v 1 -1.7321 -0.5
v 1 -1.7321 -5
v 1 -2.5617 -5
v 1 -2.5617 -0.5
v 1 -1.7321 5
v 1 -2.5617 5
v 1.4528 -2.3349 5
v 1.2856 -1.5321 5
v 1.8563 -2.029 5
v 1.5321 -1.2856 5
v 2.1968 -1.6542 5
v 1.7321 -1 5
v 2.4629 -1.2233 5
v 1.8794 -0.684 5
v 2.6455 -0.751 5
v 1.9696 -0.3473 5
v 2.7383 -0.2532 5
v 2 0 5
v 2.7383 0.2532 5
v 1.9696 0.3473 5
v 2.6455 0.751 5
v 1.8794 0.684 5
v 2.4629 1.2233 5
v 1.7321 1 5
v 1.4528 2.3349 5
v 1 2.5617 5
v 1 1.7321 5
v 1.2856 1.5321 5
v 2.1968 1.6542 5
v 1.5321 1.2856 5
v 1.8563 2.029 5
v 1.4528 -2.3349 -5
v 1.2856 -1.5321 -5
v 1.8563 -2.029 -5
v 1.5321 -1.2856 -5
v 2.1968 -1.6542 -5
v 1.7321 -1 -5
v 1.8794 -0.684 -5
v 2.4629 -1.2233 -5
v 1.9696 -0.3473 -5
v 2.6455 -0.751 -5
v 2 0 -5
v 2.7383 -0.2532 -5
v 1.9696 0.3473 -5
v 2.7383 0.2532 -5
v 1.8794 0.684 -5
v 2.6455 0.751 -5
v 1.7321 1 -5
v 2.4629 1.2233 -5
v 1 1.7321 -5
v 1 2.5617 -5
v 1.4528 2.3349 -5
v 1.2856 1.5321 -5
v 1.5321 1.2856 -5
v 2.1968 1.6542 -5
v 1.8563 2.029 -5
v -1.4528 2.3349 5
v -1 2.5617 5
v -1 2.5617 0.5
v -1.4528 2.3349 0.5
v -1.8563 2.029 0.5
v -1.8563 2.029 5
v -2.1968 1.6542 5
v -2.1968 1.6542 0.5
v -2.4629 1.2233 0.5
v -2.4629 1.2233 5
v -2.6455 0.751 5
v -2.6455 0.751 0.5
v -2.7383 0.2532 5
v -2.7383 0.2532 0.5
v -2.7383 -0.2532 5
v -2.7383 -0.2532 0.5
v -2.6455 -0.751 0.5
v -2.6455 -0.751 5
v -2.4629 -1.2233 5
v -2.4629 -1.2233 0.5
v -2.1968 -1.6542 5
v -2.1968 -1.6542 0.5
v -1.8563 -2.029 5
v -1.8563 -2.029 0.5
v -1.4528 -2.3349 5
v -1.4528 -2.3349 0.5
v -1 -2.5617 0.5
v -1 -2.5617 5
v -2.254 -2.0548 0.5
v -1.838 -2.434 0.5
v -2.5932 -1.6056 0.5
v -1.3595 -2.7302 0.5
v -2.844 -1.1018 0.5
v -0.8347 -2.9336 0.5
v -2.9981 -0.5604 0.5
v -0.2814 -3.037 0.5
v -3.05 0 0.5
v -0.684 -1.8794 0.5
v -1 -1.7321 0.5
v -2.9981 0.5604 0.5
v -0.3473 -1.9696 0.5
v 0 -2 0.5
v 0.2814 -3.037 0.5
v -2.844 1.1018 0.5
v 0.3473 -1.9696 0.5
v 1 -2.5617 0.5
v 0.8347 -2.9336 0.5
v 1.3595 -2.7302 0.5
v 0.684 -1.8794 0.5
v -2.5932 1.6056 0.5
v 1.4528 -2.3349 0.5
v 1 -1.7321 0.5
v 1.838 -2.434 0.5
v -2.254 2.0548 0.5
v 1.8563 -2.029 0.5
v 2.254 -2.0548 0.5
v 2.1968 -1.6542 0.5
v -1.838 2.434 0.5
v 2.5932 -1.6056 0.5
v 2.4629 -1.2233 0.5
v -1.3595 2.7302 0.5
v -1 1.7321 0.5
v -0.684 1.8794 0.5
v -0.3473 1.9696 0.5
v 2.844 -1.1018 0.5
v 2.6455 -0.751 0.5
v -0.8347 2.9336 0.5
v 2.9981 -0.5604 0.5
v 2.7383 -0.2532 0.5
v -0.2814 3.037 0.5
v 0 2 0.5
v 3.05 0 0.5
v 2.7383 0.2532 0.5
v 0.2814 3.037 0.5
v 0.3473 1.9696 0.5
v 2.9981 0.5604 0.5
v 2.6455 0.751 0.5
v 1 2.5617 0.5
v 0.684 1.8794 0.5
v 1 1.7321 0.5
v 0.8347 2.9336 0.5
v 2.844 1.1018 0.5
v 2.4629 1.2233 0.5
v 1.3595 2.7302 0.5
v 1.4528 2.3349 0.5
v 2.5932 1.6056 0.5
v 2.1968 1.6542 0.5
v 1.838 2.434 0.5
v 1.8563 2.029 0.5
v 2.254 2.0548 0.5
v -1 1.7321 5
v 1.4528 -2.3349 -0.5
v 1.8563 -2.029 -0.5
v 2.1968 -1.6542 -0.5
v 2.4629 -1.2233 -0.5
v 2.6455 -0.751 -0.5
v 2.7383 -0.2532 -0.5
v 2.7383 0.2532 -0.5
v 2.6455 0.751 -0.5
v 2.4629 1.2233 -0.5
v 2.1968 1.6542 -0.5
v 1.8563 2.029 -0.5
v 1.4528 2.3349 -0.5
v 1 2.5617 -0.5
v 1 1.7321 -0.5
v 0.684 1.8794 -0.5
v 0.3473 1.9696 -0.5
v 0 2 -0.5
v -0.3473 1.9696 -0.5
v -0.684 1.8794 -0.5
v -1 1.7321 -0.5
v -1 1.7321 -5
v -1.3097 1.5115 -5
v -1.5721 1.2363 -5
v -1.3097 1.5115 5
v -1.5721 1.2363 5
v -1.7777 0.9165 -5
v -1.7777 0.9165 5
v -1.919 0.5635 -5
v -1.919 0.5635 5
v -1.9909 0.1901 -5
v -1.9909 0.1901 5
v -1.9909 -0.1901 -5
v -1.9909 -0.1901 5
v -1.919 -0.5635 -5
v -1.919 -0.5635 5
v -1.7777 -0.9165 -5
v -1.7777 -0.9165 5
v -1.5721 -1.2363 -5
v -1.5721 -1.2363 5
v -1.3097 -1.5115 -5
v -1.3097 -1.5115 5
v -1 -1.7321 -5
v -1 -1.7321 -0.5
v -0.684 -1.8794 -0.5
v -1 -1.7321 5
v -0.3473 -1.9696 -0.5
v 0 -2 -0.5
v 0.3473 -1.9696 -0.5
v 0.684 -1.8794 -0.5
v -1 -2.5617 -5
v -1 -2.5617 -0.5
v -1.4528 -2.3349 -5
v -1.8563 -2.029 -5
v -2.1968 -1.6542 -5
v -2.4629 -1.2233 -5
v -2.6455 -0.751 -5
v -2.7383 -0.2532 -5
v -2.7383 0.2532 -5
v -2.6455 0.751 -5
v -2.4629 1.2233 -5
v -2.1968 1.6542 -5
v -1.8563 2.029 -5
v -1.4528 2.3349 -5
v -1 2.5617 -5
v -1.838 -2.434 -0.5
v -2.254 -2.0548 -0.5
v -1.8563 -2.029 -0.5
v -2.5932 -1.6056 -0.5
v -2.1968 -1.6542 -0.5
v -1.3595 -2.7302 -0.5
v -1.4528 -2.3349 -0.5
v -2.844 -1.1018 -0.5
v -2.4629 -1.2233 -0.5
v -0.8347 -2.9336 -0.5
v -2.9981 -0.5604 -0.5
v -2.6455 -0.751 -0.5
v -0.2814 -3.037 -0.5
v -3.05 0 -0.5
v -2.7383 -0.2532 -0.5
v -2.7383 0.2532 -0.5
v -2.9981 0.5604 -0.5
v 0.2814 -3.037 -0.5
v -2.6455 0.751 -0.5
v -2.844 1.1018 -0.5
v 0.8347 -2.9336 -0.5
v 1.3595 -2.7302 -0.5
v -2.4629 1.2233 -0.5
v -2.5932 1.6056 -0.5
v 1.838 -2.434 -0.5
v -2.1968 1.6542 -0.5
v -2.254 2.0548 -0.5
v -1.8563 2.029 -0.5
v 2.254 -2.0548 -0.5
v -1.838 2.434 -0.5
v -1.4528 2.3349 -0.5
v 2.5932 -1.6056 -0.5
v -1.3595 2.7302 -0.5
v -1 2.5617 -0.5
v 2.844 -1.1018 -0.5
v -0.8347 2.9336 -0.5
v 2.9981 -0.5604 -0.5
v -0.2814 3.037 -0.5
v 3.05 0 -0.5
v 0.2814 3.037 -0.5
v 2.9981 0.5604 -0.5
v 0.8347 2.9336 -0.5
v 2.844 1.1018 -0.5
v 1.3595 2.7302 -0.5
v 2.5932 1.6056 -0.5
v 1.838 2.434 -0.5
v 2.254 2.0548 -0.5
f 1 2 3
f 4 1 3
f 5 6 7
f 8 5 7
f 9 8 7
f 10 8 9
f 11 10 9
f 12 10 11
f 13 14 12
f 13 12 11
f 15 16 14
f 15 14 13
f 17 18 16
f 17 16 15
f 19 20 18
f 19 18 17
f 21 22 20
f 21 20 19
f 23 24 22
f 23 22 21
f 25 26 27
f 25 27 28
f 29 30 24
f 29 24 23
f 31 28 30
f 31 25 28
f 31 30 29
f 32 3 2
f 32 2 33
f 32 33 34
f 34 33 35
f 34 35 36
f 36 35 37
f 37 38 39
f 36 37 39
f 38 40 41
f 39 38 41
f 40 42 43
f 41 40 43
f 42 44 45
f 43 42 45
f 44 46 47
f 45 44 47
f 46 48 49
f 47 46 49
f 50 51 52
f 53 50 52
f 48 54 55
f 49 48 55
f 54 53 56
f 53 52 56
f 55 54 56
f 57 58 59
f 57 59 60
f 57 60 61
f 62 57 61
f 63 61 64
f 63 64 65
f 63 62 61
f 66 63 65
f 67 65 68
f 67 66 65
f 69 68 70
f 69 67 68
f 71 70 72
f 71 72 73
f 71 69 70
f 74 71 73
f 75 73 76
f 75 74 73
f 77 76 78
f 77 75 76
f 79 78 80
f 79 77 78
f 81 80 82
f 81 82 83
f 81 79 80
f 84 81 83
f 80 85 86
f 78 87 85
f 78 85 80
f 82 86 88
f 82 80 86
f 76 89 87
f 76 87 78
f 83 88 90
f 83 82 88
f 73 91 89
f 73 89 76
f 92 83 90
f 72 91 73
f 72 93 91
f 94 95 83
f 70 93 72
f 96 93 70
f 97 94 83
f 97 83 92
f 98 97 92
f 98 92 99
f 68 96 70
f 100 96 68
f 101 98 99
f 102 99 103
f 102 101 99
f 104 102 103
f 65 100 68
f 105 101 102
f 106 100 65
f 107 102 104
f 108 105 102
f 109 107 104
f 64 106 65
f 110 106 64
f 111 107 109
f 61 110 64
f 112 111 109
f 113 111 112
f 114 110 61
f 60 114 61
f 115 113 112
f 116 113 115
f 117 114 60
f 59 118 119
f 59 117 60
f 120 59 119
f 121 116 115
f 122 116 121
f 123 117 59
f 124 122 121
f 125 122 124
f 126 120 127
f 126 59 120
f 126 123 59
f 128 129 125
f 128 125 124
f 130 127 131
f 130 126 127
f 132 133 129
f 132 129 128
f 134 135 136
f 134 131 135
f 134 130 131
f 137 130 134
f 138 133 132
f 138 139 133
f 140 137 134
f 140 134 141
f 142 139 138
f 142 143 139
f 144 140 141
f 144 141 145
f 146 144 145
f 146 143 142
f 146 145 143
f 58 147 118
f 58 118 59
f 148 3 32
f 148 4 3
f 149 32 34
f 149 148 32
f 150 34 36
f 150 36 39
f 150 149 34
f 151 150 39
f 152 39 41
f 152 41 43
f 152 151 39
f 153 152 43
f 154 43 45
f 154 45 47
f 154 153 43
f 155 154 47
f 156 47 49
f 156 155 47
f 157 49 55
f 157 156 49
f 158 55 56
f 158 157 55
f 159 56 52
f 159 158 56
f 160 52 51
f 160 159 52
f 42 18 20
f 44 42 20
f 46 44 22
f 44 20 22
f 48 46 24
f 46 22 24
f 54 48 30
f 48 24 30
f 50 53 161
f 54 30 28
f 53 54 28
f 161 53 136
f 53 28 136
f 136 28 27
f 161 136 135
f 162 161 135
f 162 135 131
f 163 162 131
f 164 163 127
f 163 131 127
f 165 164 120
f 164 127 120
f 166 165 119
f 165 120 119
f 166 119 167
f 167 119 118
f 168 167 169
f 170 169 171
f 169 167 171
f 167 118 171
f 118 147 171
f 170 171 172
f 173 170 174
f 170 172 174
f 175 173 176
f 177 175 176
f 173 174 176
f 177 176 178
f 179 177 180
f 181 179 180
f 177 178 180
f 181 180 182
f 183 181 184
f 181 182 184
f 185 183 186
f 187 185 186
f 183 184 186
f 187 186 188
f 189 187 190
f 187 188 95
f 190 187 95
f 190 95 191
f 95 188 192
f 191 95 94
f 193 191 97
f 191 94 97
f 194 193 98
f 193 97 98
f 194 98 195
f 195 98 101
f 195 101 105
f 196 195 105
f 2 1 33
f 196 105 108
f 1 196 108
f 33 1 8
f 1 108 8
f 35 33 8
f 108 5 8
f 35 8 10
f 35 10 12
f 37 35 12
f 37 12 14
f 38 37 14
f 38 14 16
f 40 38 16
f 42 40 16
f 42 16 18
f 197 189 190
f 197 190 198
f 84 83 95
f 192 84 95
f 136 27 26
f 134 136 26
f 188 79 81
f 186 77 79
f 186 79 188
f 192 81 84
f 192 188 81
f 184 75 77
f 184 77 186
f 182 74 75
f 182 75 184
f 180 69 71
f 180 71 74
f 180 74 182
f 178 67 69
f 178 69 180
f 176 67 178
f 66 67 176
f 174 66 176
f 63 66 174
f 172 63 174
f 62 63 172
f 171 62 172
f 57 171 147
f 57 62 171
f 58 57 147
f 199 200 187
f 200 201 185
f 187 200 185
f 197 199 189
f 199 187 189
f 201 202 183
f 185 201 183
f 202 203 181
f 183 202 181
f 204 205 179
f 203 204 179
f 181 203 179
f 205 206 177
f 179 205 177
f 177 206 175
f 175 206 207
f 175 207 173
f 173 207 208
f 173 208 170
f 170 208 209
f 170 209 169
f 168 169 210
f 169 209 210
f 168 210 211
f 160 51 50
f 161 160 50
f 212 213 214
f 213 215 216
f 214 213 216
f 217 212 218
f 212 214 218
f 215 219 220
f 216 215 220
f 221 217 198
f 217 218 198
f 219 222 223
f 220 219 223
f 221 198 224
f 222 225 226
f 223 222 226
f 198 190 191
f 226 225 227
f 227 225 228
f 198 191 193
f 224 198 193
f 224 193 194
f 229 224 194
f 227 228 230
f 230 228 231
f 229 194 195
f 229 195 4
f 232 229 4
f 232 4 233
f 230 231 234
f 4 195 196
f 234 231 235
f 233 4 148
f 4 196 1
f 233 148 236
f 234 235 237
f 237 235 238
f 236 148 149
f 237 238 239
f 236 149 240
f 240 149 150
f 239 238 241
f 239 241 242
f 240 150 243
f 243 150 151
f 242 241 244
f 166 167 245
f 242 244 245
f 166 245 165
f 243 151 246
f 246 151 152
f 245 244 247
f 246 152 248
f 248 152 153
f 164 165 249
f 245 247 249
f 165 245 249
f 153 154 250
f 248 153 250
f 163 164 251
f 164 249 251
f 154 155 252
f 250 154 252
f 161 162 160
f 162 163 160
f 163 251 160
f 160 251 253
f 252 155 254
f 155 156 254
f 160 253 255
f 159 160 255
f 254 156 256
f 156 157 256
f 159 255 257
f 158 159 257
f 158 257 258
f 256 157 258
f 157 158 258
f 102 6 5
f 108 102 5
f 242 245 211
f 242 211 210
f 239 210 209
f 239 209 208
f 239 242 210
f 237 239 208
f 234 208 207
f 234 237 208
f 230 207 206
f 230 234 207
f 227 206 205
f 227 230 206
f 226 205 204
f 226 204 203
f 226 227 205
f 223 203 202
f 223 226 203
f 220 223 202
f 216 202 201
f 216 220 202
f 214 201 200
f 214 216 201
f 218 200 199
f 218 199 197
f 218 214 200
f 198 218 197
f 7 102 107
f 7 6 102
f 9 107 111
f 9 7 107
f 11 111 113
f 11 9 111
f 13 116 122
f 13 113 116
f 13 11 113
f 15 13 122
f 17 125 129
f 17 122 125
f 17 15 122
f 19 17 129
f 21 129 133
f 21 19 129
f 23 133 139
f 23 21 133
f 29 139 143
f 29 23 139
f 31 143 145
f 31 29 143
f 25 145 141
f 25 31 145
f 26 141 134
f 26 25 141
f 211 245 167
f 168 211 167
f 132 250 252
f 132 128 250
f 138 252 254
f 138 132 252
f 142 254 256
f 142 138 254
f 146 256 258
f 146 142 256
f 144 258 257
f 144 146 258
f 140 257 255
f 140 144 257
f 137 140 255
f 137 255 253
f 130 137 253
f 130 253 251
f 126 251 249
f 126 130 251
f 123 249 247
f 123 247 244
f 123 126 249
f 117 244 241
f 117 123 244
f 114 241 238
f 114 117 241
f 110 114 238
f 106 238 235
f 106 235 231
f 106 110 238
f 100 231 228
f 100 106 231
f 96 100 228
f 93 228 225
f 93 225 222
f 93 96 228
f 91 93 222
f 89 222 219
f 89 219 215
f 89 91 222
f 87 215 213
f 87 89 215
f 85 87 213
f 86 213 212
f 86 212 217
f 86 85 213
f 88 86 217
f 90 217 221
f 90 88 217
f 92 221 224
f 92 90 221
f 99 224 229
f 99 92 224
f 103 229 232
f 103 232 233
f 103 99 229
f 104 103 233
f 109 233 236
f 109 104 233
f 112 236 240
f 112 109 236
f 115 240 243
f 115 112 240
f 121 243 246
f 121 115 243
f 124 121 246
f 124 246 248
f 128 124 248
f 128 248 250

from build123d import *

# Parameters (mm, degrees)
F0_R     = 2.75
F1_DEPTH = 5
F2_R     = 3.05
F3_DEPTH = 0.5
F4_R     = 2
F5_DEPTH = 25
F6_W     = 2
F6_H     = 8.049181
F7_DEPTH = 4.5
F8_W     = 2
F8_H     = 8.049182
F9_DEPTH = 4.5


with BuildPart() as f1:
    # F0 (on Top) → F1 (new body, symmetric)
    with BuildSketch(Plane.XY):
        Circle(F0_R)
    extrude(amount=F1_DEPTH, both=True)

    # F2 (on Top) → F3 (join, symmetric)
    with BuildSketch(Plane.XY):
        Circle(F2_R)
    extrude(amount=F3_DEPTH, both=True)

    # F4 (on face) → F5 (cut)
    with BuildSketch(Plane.XY.offset(5)):
        Circle(F4_R)
    extrude(amount=-F5_DEPTH, mode=Mode.SUBTRACT)

    # F6 (on face) → F7 (cut)
    with BuildSketch(Plane.XY.offset(5)):
        with Locations((0, -0.130544)):
            Rectangle(F6_W, F6_H)
    extrude(amount=-F7_DEPTH, mode=Mode.SUBTRACT)

    # F8 (on face) → F9 (cut)
    with BuildSketch(Plane(origin=(0, 0, -5), x_dir=(1, 0, 0), z_dir=(0, 0, -1))):
        Rectangle(F8_W, F8_H)
    extrude(amount=-F9_DEPTH, mode=Mode.SUBTRACT)


solid = f1.part
